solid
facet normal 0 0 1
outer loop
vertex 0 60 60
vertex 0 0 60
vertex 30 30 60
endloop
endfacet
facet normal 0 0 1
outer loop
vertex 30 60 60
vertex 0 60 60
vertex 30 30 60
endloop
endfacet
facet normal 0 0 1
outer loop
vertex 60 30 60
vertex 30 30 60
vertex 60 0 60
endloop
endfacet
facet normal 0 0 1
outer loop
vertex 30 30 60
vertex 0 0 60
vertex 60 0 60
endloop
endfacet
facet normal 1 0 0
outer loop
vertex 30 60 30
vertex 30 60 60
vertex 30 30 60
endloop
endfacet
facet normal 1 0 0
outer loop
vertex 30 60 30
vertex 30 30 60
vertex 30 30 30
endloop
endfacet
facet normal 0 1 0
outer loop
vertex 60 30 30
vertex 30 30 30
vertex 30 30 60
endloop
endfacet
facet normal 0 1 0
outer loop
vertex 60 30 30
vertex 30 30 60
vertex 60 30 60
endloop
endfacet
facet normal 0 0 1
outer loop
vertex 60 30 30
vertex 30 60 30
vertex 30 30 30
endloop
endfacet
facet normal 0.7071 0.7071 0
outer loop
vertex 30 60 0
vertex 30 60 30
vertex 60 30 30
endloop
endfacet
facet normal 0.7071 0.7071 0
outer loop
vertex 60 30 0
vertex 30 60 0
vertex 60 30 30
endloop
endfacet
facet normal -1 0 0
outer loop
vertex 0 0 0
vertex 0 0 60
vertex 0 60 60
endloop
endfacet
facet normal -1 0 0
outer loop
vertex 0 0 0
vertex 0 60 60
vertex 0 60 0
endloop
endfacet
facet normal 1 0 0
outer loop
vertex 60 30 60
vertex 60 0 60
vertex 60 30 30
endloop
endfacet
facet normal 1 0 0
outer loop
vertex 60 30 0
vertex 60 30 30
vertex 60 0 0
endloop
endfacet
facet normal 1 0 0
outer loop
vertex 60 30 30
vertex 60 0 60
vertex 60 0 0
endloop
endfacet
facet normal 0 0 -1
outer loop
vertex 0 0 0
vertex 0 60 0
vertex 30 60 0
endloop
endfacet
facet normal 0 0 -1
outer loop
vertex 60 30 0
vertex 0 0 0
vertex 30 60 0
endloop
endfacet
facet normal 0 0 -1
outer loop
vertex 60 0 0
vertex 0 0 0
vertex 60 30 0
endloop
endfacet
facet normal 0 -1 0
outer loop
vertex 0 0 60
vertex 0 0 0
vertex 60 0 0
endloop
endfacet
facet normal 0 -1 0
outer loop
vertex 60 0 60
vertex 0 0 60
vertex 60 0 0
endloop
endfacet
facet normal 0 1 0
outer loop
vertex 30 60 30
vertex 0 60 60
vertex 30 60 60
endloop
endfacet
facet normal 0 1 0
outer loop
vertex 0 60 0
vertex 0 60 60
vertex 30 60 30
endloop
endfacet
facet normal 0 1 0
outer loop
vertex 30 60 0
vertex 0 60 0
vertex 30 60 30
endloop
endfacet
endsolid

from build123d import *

# Parameters (mm, degrees)
CROQUIS1_W              = 60
CROQUIS1_H              = 60
SALIENTE_EXTRUIR1_DEPTH = 60
CROQUIS2_W              = 30
CROQUIS2_H              = 30
CORTAR_EXTRUIR1_DEPTH   = 30
CORTAR_EXTRUIR2_DEPTH   = 30


with BuildPart() as part:
    # Croquis1 → Saliente-Extruir1 (new body)
    with BuildSketch(Plane(origin=(0, 0, 0), x_dir=(1, 0, 0), z_dir=(0, 1, 0))):
        with Locations((30, -30)):
            Rectangle(CROQUIS1_W, CROQUIS1_H)
    extrude(amount=SALIENTE_EXTRUIR1_DEPTH)

    # Croquis2 → Cortar-Extruir1 (cut)
    with BuildSketch(Plane(origin=(0, 60, 0), x_dir=(1, 0, 0), z_dir=(0, 1, 0))):
        with Locations((45, -45)):
            Rectangle(CROQUIS2_W, CROQUIS2_H)
    extrude(amount=-CORTAR_EXTRUIR1_DEPTH, mode=Mode.SUBTRACT)

    # Croquis3 → Cortar-Extruir2 (cut)
    with BuildSketch(Plane.XY.offset(30)):
        Polygon((30, 60), (60, 30), (60, 60), align=None)
    extrude(amount=-CORTAR_EXTRUIR2_DEPTH, mode=Mode.SUBTRACT)


solid = part.part
